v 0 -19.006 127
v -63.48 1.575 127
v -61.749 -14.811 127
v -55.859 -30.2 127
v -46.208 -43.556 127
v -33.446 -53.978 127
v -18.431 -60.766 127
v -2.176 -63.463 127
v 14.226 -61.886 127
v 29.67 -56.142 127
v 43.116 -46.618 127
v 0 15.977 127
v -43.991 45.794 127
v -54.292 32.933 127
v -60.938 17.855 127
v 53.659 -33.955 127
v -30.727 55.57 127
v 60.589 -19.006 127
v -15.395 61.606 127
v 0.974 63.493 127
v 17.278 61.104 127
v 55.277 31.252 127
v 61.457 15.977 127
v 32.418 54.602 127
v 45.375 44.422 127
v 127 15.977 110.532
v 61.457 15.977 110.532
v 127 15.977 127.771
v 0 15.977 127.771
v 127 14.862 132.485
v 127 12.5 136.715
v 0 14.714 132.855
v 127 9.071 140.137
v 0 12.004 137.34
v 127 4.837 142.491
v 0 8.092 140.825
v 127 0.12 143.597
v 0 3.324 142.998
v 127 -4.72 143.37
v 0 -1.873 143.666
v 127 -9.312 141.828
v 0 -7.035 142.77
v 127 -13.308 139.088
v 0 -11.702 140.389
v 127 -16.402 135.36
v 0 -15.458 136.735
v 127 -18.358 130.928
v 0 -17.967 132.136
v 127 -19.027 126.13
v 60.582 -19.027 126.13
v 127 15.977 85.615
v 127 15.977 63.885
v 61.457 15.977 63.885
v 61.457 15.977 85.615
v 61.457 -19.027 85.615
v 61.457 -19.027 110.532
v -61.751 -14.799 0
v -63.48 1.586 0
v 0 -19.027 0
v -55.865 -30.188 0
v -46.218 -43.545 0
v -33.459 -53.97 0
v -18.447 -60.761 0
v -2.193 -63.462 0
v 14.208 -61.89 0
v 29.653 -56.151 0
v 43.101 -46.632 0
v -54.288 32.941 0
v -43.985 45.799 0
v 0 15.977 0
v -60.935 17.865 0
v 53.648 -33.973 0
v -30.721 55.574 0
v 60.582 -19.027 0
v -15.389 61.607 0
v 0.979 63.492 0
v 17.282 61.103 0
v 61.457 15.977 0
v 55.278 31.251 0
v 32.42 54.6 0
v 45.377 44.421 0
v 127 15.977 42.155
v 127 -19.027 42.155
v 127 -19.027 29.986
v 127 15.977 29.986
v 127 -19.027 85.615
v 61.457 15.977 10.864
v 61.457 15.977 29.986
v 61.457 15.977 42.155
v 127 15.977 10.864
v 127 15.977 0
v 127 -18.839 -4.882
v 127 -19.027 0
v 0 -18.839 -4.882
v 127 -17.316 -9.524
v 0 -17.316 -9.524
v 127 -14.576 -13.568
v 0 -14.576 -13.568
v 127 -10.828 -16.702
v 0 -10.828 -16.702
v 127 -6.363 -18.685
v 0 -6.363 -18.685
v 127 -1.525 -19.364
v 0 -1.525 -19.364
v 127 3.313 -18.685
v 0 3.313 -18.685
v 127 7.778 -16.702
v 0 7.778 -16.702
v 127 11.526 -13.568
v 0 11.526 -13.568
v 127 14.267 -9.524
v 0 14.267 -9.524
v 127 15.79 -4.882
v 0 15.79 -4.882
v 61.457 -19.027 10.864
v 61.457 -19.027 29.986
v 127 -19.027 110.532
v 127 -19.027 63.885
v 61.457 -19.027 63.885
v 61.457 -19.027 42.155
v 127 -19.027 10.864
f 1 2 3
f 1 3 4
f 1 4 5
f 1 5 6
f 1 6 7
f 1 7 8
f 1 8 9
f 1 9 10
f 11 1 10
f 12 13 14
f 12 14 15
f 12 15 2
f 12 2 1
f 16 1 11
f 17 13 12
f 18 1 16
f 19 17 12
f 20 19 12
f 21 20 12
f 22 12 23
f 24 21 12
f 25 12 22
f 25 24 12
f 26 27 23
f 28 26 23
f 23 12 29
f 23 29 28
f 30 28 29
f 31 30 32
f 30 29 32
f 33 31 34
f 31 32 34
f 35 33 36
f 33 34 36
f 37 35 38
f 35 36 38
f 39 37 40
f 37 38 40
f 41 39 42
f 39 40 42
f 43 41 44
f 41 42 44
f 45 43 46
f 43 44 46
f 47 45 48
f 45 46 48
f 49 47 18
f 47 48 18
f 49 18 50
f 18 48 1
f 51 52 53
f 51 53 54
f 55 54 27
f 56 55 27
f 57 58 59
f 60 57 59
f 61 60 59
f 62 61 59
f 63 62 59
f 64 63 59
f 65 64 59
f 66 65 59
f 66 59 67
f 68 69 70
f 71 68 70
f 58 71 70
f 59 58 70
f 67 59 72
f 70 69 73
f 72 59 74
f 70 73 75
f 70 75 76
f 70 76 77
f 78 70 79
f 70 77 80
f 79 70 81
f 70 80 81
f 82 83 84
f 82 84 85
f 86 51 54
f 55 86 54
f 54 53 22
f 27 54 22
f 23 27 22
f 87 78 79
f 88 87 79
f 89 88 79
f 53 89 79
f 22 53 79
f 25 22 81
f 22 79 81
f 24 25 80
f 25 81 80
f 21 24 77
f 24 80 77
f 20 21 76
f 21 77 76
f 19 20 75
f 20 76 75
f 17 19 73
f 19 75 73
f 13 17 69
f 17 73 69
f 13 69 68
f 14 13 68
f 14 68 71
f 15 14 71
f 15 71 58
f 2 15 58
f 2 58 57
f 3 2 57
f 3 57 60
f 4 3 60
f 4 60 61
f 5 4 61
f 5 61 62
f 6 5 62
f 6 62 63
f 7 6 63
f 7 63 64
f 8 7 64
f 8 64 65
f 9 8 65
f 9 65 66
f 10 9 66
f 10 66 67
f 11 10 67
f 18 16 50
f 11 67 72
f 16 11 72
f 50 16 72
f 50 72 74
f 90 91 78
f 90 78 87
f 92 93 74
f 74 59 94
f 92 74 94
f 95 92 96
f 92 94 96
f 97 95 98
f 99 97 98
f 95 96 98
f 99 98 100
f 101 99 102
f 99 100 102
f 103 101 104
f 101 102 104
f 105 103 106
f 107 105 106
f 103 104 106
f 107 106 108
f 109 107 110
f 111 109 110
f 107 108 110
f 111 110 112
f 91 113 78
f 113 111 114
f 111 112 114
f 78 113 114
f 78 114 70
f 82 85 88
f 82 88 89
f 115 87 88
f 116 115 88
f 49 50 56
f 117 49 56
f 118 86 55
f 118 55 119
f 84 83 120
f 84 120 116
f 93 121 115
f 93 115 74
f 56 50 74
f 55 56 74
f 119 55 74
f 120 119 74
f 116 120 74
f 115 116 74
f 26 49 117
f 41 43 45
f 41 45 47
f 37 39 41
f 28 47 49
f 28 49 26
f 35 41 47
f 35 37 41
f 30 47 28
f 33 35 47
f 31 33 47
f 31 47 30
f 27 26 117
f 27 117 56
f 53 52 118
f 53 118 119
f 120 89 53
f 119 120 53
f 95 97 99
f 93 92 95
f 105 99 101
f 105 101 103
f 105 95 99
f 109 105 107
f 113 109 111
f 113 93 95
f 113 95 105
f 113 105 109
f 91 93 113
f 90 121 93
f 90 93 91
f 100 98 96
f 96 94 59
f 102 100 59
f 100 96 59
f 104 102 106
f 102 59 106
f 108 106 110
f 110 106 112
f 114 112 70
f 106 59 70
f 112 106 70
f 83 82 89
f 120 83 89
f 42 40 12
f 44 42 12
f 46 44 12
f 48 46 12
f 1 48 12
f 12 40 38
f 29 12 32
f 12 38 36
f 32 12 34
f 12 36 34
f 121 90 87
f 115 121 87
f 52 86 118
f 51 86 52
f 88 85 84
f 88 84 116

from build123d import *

# Parameters (mm, degrees)
F0_R     = 63.5
F1_DEPTH = 127
F3_DEPTH = 127
F4_W     = 65.542905265
F4_H     = 24.9171182513
F4_H_2   = 21.7300467193
F4_H_3   = 19.1224422306
F5_DEPTH = 35.56


with BuildPart() as f1:
    # F0 (on Top) → F1 (new body)
    with BuildSketch(Plane.XY):
        Circle(F0_R)
    extrude(amount=F1_DEPTH)

    # F2 (on Right) → F3 (join)
    with BuildSketch(Plane.YZ):
        with BuildLine():
            ThreePointArc((15.9773435444, 127.7705729008), (-2.3077528181, 143.6512031965), (-19.0271344036, 126.1297464371))
            Line((-19.0271344036, 126.1297464371), (-19.0271344036, 0))
            ThreePointArc((-19.0271344036, 0), (-1.5248954296, -19.3635171715), (15.9773435444, 0))
            Line((15.9773435444, 0), (15.9773435444, 127.7705729008))
        make_face()
    extrude(amount=F3_DEPTH)

    # F4 (on face) → F5 (cut)
    with BuildSketch(Plane(origin=(0, 15.9773435444, 0), x_dir=(-1, 0, 0), z_dir=(0, 1, 0))):
        with Locations((-94.2285473675, 98.0738960207)):
            Rectangle(F4_W, F4_H)
        with Locations((-94.2285473675, 53.0202630907)):
            Rectangle(F4_W, F4_H_2)
        with Locations((-94.2285473675, 20.4251902178)):
            Rectangle(F4_W, F4_H_3)
    extrude(amount=-F5_DEPTH, mode=Mode.SUBTRACT)


solid = f1.part
